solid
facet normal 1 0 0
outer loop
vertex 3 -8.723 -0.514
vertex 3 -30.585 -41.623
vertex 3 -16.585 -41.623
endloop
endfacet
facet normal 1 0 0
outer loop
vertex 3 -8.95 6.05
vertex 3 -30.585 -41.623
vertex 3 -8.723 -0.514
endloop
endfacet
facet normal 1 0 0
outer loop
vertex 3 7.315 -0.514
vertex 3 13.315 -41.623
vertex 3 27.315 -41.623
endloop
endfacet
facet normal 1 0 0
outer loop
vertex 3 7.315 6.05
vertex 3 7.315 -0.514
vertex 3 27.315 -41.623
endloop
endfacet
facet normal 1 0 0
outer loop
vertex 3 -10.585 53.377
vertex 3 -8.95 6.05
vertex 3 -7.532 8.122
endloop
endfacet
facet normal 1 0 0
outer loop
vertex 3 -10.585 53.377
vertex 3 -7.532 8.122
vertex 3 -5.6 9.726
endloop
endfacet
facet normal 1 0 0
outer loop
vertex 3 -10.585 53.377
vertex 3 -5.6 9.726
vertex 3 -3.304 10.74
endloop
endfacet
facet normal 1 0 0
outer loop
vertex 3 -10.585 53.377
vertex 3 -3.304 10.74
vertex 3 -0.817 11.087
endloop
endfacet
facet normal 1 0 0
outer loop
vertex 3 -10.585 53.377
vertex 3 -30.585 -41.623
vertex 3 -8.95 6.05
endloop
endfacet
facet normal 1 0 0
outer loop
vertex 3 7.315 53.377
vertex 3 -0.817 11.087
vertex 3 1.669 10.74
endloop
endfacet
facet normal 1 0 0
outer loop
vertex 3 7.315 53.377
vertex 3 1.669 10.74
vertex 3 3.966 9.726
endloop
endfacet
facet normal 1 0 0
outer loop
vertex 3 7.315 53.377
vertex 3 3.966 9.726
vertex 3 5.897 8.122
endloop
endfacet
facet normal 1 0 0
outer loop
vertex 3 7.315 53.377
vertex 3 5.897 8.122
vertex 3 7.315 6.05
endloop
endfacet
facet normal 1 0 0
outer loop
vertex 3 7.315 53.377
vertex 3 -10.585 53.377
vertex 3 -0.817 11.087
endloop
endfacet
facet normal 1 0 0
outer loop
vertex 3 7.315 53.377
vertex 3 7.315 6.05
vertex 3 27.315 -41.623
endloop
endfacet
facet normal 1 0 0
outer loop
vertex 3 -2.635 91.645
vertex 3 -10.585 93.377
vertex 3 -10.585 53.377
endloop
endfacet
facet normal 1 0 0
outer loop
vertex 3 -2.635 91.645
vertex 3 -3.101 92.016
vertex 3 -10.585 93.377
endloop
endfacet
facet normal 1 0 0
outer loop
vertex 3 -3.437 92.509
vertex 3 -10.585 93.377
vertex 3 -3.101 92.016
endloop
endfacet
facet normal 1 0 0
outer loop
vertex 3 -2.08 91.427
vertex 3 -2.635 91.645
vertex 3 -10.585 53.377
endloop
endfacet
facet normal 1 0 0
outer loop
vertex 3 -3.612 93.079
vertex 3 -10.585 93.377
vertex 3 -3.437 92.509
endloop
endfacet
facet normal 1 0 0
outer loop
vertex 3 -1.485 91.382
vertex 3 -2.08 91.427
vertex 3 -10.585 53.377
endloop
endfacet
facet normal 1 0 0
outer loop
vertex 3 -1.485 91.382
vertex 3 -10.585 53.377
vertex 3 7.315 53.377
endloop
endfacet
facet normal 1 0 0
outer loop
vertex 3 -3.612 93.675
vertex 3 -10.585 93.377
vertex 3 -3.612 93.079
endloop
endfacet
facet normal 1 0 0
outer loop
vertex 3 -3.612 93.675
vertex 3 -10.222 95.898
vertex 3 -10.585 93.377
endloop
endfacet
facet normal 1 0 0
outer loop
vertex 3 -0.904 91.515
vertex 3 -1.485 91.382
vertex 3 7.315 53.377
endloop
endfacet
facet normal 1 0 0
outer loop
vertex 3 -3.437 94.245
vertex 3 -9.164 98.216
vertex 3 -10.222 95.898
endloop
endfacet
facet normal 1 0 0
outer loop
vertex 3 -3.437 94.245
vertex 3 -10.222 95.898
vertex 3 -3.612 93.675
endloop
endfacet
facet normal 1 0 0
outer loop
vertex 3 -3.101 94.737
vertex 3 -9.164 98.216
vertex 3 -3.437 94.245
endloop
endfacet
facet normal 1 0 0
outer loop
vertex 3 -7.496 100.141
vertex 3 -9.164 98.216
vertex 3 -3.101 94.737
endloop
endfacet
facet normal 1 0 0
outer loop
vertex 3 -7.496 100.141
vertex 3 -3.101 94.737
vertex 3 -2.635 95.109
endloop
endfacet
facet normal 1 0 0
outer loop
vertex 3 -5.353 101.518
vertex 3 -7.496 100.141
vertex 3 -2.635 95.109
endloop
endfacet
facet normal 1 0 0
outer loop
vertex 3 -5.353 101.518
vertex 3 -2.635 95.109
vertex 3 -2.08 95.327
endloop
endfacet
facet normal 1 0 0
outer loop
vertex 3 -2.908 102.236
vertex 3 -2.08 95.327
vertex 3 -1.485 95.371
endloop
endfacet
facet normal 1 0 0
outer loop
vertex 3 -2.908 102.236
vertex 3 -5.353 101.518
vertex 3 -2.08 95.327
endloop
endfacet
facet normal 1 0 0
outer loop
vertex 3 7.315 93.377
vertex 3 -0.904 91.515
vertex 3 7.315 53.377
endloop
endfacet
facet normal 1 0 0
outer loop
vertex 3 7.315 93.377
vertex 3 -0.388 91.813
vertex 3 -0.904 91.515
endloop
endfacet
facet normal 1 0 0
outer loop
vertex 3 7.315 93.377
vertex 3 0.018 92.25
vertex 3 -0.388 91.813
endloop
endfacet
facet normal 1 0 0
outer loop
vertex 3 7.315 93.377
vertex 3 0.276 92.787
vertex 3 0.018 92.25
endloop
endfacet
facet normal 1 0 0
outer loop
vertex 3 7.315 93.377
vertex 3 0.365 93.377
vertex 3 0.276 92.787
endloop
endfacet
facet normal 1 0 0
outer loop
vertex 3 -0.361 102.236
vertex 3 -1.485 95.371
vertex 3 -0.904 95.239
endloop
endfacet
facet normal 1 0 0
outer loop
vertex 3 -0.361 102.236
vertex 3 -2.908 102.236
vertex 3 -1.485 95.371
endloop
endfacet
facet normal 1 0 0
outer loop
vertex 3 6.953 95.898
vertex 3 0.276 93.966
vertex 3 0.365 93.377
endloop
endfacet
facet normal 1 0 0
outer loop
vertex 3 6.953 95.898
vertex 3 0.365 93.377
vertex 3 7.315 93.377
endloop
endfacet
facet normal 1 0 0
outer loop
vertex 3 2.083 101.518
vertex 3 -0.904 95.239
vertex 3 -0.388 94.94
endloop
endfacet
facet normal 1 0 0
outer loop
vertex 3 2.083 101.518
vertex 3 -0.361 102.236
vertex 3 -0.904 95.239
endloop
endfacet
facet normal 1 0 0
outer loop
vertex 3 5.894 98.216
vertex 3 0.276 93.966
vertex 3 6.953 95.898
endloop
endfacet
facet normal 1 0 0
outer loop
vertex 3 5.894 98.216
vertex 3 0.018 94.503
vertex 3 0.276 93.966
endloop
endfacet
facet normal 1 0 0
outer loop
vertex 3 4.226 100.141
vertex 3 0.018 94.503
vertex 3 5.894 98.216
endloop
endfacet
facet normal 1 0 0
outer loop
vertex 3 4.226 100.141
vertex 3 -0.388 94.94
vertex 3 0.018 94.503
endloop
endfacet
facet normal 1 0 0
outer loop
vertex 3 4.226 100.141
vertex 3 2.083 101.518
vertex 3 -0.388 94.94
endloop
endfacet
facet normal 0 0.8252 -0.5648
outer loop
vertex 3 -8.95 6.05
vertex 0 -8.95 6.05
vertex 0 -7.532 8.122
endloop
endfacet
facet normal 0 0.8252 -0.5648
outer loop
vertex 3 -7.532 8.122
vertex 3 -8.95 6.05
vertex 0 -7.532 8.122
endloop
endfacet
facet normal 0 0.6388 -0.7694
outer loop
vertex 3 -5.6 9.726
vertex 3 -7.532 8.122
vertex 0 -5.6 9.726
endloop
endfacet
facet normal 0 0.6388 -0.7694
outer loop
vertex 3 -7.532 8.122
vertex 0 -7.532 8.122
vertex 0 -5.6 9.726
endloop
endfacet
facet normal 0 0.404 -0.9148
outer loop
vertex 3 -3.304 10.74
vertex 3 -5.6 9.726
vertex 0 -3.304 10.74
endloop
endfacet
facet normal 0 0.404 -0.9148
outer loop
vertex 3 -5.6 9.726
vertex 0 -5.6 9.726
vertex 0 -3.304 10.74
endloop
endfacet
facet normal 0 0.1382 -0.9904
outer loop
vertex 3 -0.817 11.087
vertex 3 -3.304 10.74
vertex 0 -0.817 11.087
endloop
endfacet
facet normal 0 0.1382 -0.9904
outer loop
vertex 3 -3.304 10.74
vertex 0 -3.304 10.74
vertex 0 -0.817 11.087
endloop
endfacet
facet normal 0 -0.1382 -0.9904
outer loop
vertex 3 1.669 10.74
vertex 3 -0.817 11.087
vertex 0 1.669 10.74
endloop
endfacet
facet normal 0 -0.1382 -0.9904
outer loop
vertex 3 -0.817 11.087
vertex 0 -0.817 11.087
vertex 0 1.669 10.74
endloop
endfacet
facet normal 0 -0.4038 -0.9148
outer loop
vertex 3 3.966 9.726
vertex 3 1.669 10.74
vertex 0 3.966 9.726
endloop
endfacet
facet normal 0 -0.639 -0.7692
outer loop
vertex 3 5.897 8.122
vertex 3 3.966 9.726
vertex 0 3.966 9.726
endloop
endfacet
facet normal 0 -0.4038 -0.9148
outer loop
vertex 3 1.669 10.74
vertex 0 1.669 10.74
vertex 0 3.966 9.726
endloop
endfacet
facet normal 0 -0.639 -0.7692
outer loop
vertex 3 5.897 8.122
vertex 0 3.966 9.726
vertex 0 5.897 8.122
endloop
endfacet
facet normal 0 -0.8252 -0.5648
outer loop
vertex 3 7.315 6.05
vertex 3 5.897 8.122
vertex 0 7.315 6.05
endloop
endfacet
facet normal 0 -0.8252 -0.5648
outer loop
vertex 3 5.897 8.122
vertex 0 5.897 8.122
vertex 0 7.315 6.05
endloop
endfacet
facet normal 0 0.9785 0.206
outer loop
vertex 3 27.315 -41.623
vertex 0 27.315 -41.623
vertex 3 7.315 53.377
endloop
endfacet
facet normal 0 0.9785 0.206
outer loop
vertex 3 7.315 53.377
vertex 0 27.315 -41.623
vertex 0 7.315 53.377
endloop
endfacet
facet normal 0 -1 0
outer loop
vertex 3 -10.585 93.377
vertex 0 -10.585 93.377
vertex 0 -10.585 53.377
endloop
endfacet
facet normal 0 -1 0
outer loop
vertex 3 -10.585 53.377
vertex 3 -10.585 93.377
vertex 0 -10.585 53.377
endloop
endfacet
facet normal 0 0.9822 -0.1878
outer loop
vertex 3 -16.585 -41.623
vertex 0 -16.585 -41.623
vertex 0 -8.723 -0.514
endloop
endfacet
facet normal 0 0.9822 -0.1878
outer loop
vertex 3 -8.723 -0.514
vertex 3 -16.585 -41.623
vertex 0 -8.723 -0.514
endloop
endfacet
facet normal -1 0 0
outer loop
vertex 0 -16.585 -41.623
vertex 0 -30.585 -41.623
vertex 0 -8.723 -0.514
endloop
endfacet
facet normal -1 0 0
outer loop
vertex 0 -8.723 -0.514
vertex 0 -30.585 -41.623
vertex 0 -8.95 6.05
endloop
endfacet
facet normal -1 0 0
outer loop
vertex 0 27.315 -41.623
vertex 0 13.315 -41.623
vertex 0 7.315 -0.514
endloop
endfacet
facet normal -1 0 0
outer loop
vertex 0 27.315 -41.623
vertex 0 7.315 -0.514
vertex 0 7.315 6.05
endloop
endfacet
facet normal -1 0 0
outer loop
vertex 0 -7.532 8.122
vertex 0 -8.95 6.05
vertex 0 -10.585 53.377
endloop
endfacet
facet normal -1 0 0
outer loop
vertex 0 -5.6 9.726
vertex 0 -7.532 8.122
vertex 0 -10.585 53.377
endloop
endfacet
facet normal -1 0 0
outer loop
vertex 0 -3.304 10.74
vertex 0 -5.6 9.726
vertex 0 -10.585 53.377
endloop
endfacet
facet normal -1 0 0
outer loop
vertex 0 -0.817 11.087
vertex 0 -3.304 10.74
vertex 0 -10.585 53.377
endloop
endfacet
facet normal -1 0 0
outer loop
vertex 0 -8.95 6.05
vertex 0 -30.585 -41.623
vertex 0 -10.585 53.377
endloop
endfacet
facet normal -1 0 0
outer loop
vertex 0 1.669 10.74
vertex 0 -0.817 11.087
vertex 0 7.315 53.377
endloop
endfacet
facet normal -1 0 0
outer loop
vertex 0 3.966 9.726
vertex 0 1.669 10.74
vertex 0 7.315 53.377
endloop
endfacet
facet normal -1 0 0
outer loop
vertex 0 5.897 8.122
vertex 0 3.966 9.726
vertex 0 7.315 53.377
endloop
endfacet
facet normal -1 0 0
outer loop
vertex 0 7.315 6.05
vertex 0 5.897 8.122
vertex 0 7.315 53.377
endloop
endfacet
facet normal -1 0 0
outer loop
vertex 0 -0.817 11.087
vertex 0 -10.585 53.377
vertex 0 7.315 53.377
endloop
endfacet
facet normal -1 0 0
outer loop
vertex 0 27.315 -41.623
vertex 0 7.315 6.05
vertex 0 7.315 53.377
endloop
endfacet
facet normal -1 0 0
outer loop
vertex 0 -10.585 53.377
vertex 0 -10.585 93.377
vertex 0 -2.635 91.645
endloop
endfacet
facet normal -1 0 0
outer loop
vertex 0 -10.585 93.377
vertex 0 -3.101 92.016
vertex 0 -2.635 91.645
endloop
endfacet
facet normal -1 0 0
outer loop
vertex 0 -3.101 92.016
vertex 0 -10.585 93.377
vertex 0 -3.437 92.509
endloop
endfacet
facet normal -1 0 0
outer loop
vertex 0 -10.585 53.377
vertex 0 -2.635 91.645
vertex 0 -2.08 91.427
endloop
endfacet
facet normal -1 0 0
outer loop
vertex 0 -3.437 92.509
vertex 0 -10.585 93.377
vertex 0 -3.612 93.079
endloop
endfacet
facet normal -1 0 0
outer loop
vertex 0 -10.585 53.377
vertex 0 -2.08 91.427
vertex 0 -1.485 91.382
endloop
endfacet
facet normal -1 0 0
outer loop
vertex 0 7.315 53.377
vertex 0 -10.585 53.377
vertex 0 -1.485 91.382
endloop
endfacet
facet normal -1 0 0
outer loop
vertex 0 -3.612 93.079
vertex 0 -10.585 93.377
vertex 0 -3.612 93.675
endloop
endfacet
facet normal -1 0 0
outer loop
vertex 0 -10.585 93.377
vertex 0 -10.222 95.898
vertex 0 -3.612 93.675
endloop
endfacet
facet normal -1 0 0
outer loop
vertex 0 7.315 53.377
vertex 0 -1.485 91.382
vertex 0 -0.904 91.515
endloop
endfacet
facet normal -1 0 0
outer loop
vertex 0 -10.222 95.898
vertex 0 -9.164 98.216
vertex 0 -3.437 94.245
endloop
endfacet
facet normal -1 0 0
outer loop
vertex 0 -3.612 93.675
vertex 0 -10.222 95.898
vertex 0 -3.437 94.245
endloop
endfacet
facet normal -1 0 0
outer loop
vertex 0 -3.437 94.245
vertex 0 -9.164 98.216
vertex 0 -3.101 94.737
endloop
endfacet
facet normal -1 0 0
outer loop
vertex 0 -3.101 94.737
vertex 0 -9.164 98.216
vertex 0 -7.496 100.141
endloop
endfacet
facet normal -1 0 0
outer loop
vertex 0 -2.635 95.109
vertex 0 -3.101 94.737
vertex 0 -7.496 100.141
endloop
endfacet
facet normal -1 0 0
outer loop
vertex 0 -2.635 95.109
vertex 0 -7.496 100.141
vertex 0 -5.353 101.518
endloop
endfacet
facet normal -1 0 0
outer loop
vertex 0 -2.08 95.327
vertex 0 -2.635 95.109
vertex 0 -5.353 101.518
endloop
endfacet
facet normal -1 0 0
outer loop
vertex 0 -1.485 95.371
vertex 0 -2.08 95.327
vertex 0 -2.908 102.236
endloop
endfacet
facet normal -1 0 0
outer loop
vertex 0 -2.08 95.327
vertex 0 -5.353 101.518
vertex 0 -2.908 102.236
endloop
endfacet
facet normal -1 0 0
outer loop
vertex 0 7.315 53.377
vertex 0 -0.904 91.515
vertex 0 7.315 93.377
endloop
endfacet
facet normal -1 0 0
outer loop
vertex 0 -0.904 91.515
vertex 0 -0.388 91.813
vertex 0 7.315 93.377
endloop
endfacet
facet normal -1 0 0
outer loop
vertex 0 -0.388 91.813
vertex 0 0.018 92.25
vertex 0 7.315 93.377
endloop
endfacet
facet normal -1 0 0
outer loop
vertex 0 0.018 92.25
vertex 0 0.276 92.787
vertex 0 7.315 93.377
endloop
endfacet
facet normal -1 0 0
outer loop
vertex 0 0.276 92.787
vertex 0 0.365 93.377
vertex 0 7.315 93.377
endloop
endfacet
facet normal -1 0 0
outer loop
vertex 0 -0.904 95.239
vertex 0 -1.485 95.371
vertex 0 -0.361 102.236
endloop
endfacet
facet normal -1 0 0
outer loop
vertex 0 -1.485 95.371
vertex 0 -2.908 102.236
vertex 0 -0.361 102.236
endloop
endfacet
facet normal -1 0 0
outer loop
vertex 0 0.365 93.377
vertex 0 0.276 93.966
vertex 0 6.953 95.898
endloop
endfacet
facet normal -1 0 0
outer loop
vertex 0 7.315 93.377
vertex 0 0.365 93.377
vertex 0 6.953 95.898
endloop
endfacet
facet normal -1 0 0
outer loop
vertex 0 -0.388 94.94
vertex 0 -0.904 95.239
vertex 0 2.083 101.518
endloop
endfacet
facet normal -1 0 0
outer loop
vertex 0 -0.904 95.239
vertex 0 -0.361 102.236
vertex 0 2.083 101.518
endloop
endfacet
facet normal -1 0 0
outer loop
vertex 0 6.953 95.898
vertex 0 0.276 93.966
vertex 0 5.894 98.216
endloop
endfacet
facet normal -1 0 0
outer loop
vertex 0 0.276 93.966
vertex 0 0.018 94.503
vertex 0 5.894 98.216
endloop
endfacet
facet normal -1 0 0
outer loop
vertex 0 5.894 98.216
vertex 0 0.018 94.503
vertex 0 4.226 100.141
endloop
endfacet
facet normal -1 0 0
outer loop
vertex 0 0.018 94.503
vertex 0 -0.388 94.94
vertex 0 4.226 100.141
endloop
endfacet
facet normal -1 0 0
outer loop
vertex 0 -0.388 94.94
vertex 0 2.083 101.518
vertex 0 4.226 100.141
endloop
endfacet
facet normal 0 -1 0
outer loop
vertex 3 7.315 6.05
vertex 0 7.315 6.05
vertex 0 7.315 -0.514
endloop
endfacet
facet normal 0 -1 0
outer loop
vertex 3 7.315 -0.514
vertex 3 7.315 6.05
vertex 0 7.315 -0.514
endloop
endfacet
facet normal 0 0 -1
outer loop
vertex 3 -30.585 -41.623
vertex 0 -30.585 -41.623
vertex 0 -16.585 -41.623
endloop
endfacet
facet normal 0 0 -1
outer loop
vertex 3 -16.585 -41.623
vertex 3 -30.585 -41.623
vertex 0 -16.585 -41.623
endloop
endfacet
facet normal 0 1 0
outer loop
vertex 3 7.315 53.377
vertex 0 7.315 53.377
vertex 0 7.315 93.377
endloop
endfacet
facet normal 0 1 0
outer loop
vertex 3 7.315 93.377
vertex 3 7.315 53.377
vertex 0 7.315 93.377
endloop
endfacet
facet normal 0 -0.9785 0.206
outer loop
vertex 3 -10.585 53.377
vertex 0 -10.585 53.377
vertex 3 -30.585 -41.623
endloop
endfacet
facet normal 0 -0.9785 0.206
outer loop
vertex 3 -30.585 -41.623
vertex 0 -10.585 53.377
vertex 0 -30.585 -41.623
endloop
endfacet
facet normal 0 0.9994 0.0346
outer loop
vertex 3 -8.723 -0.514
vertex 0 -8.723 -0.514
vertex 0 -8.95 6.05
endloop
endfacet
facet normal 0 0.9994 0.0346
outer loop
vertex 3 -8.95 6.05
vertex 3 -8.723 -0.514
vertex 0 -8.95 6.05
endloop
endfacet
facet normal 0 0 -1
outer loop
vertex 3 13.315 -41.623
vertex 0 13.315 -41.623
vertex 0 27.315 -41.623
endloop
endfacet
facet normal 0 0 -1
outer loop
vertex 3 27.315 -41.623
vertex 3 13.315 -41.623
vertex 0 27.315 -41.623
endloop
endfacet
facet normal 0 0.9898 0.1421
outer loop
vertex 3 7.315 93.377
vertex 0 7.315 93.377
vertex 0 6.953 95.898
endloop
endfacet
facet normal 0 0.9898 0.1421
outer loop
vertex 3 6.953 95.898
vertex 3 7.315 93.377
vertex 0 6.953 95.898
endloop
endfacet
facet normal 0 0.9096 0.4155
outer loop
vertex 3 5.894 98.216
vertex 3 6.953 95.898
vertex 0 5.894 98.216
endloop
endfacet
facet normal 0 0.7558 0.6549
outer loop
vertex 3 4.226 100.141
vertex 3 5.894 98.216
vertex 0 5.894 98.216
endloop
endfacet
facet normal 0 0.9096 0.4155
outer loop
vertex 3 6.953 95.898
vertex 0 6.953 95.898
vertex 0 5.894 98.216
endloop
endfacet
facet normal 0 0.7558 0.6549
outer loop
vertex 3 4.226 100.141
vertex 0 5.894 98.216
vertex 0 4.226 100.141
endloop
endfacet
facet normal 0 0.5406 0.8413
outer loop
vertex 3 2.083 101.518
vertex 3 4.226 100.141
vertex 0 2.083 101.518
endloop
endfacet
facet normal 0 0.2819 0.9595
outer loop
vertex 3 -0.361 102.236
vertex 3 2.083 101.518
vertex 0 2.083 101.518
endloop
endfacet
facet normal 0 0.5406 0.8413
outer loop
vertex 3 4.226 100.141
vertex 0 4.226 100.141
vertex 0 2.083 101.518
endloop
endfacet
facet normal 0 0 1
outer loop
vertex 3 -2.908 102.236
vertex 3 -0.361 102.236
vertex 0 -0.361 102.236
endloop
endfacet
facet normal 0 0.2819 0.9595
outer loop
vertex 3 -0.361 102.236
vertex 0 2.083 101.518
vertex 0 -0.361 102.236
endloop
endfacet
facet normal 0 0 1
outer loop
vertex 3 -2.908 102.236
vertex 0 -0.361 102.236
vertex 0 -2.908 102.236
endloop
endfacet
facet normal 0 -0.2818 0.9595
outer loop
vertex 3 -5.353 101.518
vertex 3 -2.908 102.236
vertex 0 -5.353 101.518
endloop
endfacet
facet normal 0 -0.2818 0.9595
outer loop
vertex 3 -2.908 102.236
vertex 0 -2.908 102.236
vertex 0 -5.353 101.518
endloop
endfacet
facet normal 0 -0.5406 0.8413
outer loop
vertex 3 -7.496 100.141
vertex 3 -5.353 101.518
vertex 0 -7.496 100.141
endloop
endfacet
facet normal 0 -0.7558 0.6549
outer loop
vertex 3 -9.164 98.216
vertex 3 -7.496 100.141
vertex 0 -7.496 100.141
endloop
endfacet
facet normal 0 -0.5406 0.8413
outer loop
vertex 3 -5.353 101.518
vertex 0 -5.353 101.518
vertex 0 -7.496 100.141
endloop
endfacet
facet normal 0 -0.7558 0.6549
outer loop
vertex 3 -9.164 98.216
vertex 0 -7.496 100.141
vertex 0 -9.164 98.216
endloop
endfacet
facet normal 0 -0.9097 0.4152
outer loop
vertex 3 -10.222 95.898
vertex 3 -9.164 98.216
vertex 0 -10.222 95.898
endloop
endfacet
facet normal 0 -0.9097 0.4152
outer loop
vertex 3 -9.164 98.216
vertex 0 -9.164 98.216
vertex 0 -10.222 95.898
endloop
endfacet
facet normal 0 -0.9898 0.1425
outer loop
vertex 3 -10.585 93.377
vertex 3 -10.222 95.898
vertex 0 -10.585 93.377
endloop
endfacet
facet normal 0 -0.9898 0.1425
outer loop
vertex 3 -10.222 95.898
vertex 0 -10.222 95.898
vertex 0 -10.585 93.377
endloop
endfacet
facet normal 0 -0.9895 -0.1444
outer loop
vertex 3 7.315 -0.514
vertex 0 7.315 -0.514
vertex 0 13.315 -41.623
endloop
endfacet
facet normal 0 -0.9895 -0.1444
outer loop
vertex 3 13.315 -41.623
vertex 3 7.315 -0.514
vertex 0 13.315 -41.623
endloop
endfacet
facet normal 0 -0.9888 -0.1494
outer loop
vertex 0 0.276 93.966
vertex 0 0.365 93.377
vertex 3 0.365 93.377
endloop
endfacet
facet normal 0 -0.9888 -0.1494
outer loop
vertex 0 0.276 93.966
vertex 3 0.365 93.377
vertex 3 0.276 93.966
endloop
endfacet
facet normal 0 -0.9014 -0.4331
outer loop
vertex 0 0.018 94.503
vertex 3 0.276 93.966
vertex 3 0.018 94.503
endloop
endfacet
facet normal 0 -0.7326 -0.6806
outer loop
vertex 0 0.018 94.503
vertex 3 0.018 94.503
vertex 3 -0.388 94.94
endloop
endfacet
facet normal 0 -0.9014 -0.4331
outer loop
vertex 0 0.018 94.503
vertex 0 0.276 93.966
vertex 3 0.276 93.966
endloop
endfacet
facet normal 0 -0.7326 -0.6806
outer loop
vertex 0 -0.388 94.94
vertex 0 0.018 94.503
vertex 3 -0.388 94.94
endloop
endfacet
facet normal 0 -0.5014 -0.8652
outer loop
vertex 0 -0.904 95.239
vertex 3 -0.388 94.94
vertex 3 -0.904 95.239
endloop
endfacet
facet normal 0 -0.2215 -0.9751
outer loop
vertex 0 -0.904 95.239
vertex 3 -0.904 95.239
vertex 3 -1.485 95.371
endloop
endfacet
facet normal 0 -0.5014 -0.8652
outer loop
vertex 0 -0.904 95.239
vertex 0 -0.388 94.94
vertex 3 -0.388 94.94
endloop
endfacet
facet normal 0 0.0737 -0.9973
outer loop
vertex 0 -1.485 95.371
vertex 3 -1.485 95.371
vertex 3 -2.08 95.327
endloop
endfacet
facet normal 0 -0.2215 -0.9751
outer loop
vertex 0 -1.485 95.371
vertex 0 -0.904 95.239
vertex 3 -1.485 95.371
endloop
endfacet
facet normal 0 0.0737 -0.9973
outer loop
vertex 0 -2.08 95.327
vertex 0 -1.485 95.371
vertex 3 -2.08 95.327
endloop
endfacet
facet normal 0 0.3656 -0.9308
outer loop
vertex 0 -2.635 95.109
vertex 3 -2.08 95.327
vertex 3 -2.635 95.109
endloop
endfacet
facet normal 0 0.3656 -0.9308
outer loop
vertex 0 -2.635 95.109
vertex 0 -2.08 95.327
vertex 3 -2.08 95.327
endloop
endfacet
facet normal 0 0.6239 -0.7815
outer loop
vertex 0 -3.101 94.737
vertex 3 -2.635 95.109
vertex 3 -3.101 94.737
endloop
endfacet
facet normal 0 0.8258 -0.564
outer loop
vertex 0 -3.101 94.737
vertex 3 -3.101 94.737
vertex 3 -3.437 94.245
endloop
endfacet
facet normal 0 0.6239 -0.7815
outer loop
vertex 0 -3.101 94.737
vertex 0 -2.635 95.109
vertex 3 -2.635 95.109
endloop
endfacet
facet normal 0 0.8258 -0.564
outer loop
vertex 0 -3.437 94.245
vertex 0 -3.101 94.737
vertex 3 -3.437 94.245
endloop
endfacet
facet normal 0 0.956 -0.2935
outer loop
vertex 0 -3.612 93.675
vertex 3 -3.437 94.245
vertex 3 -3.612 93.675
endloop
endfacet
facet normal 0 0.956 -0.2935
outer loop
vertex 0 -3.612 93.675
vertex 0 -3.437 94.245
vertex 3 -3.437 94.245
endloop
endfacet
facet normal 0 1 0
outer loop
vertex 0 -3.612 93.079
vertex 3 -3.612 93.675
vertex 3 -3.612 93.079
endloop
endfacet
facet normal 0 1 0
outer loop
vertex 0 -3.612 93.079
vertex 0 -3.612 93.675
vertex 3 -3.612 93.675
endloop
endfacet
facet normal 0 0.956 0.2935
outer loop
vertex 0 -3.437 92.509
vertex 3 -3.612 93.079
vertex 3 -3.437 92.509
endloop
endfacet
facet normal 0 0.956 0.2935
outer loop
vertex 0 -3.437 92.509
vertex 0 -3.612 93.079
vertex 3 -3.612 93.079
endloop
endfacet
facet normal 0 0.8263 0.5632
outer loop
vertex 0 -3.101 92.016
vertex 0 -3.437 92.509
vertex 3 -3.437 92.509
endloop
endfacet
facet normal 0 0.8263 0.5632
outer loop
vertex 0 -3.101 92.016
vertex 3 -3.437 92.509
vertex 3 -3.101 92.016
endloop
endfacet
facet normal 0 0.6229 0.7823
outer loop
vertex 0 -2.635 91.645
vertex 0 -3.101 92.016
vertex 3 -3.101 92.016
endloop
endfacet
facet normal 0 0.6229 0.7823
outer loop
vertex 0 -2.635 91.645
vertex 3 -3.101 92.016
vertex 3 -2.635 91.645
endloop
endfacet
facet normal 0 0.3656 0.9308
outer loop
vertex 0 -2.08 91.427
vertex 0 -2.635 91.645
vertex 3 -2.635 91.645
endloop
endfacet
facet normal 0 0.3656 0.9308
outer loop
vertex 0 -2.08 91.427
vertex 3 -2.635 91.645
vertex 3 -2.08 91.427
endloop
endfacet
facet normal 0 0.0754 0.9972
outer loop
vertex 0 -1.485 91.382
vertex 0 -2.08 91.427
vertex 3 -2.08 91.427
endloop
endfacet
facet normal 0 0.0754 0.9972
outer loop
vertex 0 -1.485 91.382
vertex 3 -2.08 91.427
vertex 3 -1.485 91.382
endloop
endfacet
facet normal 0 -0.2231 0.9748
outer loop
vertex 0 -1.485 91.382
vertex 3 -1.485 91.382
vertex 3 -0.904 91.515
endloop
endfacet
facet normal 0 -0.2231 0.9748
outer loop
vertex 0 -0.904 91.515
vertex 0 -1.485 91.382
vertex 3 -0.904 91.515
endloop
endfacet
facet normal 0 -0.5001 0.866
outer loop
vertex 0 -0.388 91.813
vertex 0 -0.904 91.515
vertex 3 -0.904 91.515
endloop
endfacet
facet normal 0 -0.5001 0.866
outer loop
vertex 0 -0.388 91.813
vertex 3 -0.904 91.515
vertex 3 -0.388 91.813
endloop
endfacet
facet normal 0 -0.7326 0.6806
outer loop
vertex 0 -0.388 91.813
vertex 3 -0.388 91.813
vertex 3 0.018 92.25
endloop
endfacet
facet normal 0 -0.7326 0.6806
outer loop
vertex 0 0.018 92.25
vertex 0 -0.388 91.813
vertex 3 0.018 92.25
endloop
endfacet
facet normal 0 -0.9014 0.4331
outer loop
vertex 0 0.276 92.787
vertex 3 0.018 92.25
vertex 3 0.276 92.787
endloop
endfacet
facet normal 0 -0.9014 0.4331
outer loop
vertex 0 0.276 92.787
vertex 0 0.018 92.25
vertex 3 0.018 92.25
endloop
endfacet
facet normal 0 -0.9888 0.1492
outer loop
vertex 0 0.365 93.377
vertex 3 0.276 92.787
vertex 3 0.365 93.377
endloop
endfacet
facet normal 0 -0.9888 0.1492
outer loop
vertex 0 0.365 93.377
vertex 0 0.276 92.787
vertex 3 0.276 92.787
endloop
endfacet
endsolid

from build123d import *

# Parameters (mm, degrees)
F1_R     = 2
F2_DEPTH = 3


with BuildPart() as f2:
    # F1 (on face) → F2 (new body)
    with BuildSketch(Plane.YZ):
        with BuildLine():
            Line((7.315274, 53.376805), (7.315274, 93.376805))
            ThreePointArc((7.315274, 93.376805), (-1.634726, 102.326805), (-10.584726, 93.376805))
            Line((-10.584726, 93.376805), (-10.584726, 53.376805))
            Line((-10.584726, 53.376805), (-30.584726, -41.623195))
            Line((-30.584726, -41.623195), (-16.584726, -41.623195))
            Line((-16.584726, -41.623195), (-8.723256, -0.514457))
            Line((-8.723256, -0.514457), (-8.95, 6.05))
            ThreePointArc((-8.95, 6.05), (-0.817363, 11.086847), (7.315274, 6.05))
            Line((7.315274, 6.05), (7.315274, -0.514457))
            Line((7.315274, -0.514457), (13.315274, -41.623195))
            Line((13.315274, -41.623195), (27.315274, -41.623195))
            Line((27.315274, -41.623195), (7.315274, 53.376805))
        make_face()
        with Locations((-1.634726, 93.376805)):
            Circle(F1_R, mode=Mode.SUBTRACT)
    extrude(amount=F2_DEPTH)


solid = f2.part
